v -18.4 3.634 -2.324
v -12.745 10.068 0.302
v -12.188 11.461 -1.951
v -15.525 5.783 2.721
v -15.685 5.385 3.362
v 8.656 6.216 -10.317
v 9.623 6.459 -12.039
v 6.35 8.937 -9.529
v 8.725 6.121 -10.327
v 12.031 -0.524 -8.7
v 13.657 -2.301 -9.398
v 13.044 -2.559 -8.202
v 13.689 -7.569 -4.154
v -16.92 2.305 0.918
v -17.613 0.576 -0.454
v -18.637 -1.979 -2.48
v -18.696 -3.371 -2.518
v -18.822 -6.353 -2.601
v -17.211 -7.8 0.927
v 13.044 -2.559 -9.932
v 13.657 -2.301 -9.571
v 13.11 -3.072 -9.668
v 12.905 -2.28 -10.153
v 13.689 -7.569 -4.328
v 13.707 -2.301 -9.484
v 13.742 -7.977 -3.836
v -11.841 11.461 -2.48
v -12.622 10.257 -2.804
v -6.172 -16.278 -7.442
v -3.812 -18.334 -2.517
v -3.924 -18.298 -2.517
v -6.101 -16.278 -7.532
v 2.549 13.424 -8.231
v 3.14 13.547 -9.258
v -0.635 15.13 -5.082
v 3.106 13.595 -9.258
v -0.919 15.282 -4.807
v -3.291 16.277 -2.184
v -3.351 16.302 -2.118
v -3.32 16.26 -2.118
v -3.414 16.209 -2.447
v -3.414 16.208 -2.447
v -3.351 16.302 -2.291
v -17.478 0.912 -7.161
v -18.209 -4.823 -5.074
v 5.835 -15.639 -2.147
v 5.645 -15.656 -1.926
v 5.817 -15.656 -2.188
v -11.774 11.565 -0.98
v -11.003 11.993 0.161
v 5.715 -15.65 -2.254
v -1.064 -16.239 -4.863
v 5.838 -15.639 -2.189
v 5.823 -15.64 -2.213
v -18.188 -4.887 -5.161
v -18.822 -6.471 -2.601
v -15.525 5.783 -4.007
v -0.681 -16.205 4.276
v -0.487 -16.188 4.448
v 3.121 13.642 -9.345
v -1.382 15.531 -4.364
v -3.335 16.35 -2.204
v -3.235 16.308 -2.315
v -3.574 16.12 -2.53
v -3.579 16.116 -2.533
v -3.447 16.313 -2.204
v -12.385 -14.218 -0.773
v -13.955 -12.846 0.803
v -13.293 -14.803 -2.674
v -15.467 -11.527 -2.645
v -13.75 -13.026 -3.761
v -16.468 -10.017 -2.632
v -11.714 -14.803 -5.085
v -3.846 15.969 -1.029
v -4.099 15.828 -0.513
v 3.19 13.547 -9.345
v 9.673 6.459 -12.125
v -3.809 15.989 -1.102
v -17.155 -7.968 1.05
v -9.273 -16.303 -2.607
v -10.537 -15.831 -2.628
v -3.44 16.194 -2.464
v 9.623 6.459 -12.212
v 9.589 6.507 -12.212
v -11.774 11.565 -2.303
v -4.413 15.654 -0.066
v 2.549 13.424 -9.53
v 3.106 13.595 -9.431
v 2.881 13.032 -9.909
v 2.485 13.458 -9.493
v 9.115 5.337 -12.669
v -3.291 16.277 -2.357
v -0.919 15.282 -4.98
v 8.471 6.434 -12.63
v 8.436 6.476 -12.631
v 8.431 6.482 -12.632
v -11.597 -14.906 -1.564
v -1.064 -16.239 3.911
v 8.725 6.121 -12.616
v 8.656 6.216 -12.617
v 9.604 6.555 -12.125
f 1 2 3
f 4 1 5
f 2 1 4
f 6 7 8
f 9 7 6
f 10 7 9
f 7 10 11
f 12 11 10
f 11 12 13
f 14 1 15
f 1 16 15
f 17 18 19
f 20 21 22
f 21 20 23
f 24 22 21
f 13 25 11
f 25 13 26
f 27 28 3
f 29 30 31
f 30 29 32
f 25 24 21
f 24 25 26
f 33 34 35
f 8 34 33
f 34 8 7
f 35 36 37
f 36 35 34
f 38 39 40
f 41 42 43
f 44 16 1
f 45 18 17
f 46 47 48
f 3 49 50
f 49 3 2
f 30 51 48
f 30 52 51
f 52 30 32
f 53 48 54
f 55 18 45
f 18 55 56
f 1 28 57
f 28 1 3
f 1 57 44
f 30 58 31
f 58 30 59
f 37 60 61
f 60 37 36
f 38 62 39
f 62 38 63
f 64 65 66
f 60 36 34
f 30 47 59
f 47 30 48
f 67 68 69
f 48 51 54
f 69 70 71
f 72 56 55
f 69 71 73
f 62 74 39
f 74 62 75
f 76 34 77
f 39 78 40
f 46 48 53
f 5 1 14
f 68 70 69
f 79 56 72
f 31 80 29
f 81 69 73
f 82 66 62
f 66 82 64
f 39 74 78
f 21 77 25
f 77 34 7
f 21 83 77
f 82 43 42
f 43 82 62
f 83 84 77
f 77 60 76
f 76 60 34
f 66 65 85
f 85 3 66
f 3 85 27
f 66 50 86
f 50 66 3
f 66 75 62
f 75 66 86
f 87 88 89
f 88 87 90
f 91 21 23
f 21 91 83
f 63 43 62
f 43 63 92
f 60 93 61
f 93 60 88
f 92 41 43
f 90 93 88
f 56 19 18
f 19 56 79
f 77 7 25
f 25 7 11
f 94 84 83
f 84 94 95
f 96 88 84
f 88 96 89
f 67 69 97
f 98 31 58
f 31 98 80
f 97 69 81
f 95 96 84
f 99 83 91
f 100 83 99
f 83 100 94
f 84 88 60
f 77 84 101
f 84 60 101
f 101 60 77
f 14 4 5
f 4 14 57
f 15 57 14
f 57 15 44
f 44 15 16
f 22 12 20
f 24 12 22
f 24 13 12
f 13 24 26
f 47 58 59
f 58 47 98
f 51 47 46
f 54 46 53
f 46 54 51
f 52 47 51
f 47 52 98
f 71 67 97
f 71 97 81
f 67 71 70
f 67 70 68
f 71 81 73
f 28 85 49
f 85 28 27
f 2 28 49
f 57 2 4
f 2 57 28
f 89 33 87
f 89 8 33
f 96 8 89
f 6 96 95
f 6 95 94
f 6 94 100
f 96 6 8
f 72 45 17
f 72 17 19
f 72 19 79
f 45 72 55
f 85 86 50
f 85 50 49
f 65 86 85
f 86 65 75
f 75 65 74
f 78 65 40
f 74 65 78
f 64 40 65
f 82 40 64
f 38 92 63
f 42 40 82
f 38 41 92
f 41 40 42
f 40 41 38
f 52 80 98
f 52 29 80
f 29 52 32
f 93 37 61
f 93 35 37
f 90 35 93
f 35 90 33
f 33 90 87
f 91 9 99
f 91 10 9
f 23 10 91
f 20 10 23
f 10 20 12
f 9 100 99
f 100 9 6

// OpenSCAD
// Auto-generated OpenSCAD file

    inner_points = 10*[[-0.45355703407615483, -0.9852604747027949, 1.2442629448836795], [-0.11128666904117222, 0.5835651383085163, -1.565322994036517], [-1.0016741042155215, -0.15000111337832142, 1.287960504788888], [0.1599278591139769, -1.520900805152802, 0.6639822178016064], [-0.7247715622313039, 1.119205468758524, -0.9850422669544439], [0.43683040109819454, -0.25169422301595684, -1.6090205539417255], [-1.2750612603248952, 0.6658365922161982, 0.7783839148588771], [0.604450197740842, -1.5523257042416663, -0.23123416172848094], [-1.1692939008581689, 1.150630367847388, -0.08982588742435665], [0.7102175572075684, -1.0675319286104765, -1.0994439640117146], [-0.07373926097703089, -0.15917918368749281, 1.6605899316050716], [0.5369510310439554, -0.879903803247868, 1.3325451328490563], [0.25177920002421017, 1.3328626384976536, -1.0114850836962188], [0.8624694920451964, 0.6121380189372783, -1.3395298824522341], [-0.5056295914533497, 0.708853913520469, 1.415662831037149], [1.0931783496571914, -1.1780276370174307, 0.5568303980612812], [-0.3044481185890256, 1.6309864722672165, -0.23577034890844362], [1.2943598225215154, -0.2558950782706834, -1.0946027818843114], [-0.5937525335554718, 1.3926363486024174, 0.691317658796271], [1.3824827646236373, -0.9396775133526316, -0.3702576096434335], [-0.8286998825229884, -1.5635001676990283, 0.5197584930665651], [-0.5517973405387707, -0.2942935855621831, -1.7532442786767668], [-1.715571931822494, -0.2120221316545012, 0.5904626302186273], [-1.5444367493050026, 0.5723906748511545, -0.8143303392414709], [-0.10944762986613042, -1.614346722517846, -0.9287320362987417], [-1.608667983638949, -1.0856125902905323, 0.11568767674818647], [-1.4375328011214579, -0.30119978378487644, -1.2891052927119118], [-0.9951830904488174, -1.6212529207405393, -0.4645930503338865], [-0.889415730982091, -1.1364591451093493, -1.3328028526171203], [-1.8820551397483227, -0.2697748846960123, -0.39388891318182445]];

    outer_points = 10*[[-1.2023976649193235, -0.20790108708079238, 1.1467271385135702], [0.5703055554767221, -0.20790108708079238, -1.5606072049684219], [-1.4167473948229383, 0.6253103044559617, 0.6370086178537524], [-0.649491745903262, -1.0411124786175465, 1.139390809023269], [0.01739963646066056, 0.6253103044559617, -1.5532708754781206], [0.7846552853803369, -1.0411124786175465, -1.050888684308604], [-1.210666624270285, 1.1402632642392723, -0.19506960275945007], [0.0307790937421078, -1.5560654384008572, 0.6178018578954751], [-0.662871203184709, 1.1402632642392723, -1.0316819243503268], [0.5785745148276837, -1.5560654384008572, -0.21881046369540158], [-0.7286095026793453, 0.645946238583741, 1.3622950437703323], [-0.32523933709311637, -0.2301440644221562, 1.6264129918427295], [0.9573314465357177, 0.645946238583741, -1.2125329253878778], [1.3607016121219466, -0.2301440644221562, -0.9484149773154806], [-0.7329567518749942, 1.354718182322609, 0.6568707507430379], [0.32308005167742637, -0.9389160081610243, 1.3483405158354533], [0.30901205776517493, 1.354718182322609, -0.9344604493806018], [1.3650488613175955, -0.9389160081610243, -0.24299068428818626], [-0.336620583244891, 1.6254449745585284, -0.22041178379259257], [0.9687126926874923, -1.2096428003969435, 0.6342918502474442], [-1.4850387512679277, -0.9906633299119916, 0.5922929336654642], [-0.05089171998432884, -0.9906633299119916, -1.597986559666409], [-1.8318638997313361, 0.35750102140807305, -0.23244895745743688], [-0.9455122895333135, 0.35750102140807305, -1.586116129198433], [-0.3843374111662901, -1.8238747214487456, -0.2516557174157139], [-1.874070279152174, -0.6412256095550173, -0.26008477011600517], [-0.9877186689541513, -0.6412256095550173, -1.6137519418570012], [-1.3211643601361125, -1.4744370010917713, -0.26742109960630656], [-0.7733689390505365, -1.4744370010917713, -1.1040334211971832], [-1.6679895085995209, -0.12627264977170682, -1.0921629907292074]];

    // Convex hull for inner set (I)
    module inner_hull() {
        hull() {
            for (p = inner_points) {
                translate(p) sphere(r=0.1);
            }
        }
    }

    // Convex hull for outer set (O) minus inner hull (O \ I)
    module outer_minus_inner() {
        difference() {
            hull() {
                for (p = outer_points) {
                    translate(p) sphere(r=0.1);
                }
            }
            inner_hull(); // Subtract inner hull
        }
    }

    // Convex hull for outer set (O) minus all translated inner hulls
    module outer_minus_AllTranslationInner() {
        difference() {
            hull() {
                for (p = outer_points) {
                    translate(p) sphere(r=0.1);
                }
            }
            hull() {
                translate([0,0,50]) inner_hull();
                translate([0,0,-50]) inner_hull();
            }; // Subtract translated inner hulls
        }
    }

    // Difference between outer_minus_inner and outer_minus_AllTranslationInner
    module outer_minus_inner_diff() {
        difference() {
            // Outer minus inner
            difference() {
                hull() {
                    for (p = outer_points) {
                        translate(p) sphere(r=0.1);
                    }
                }
                inner_hull();
            }

            // Subtract Outer minus AllTranslationInner
            difference() {
                hull() {
                    for (p = outer_points) {
                        translate(p) sphere(r=0.1);
                    }
                }
                hull() {
                    translate([0,0,50]) inner_hull();
                    translate([0,0,-50]) inner_hull();
                };
            }
        }
    }

    // Rendering all with colors applied
    color([0, 1, 0, 1]) outer_minus_AllTranslationInner(); // Opaque green
    
